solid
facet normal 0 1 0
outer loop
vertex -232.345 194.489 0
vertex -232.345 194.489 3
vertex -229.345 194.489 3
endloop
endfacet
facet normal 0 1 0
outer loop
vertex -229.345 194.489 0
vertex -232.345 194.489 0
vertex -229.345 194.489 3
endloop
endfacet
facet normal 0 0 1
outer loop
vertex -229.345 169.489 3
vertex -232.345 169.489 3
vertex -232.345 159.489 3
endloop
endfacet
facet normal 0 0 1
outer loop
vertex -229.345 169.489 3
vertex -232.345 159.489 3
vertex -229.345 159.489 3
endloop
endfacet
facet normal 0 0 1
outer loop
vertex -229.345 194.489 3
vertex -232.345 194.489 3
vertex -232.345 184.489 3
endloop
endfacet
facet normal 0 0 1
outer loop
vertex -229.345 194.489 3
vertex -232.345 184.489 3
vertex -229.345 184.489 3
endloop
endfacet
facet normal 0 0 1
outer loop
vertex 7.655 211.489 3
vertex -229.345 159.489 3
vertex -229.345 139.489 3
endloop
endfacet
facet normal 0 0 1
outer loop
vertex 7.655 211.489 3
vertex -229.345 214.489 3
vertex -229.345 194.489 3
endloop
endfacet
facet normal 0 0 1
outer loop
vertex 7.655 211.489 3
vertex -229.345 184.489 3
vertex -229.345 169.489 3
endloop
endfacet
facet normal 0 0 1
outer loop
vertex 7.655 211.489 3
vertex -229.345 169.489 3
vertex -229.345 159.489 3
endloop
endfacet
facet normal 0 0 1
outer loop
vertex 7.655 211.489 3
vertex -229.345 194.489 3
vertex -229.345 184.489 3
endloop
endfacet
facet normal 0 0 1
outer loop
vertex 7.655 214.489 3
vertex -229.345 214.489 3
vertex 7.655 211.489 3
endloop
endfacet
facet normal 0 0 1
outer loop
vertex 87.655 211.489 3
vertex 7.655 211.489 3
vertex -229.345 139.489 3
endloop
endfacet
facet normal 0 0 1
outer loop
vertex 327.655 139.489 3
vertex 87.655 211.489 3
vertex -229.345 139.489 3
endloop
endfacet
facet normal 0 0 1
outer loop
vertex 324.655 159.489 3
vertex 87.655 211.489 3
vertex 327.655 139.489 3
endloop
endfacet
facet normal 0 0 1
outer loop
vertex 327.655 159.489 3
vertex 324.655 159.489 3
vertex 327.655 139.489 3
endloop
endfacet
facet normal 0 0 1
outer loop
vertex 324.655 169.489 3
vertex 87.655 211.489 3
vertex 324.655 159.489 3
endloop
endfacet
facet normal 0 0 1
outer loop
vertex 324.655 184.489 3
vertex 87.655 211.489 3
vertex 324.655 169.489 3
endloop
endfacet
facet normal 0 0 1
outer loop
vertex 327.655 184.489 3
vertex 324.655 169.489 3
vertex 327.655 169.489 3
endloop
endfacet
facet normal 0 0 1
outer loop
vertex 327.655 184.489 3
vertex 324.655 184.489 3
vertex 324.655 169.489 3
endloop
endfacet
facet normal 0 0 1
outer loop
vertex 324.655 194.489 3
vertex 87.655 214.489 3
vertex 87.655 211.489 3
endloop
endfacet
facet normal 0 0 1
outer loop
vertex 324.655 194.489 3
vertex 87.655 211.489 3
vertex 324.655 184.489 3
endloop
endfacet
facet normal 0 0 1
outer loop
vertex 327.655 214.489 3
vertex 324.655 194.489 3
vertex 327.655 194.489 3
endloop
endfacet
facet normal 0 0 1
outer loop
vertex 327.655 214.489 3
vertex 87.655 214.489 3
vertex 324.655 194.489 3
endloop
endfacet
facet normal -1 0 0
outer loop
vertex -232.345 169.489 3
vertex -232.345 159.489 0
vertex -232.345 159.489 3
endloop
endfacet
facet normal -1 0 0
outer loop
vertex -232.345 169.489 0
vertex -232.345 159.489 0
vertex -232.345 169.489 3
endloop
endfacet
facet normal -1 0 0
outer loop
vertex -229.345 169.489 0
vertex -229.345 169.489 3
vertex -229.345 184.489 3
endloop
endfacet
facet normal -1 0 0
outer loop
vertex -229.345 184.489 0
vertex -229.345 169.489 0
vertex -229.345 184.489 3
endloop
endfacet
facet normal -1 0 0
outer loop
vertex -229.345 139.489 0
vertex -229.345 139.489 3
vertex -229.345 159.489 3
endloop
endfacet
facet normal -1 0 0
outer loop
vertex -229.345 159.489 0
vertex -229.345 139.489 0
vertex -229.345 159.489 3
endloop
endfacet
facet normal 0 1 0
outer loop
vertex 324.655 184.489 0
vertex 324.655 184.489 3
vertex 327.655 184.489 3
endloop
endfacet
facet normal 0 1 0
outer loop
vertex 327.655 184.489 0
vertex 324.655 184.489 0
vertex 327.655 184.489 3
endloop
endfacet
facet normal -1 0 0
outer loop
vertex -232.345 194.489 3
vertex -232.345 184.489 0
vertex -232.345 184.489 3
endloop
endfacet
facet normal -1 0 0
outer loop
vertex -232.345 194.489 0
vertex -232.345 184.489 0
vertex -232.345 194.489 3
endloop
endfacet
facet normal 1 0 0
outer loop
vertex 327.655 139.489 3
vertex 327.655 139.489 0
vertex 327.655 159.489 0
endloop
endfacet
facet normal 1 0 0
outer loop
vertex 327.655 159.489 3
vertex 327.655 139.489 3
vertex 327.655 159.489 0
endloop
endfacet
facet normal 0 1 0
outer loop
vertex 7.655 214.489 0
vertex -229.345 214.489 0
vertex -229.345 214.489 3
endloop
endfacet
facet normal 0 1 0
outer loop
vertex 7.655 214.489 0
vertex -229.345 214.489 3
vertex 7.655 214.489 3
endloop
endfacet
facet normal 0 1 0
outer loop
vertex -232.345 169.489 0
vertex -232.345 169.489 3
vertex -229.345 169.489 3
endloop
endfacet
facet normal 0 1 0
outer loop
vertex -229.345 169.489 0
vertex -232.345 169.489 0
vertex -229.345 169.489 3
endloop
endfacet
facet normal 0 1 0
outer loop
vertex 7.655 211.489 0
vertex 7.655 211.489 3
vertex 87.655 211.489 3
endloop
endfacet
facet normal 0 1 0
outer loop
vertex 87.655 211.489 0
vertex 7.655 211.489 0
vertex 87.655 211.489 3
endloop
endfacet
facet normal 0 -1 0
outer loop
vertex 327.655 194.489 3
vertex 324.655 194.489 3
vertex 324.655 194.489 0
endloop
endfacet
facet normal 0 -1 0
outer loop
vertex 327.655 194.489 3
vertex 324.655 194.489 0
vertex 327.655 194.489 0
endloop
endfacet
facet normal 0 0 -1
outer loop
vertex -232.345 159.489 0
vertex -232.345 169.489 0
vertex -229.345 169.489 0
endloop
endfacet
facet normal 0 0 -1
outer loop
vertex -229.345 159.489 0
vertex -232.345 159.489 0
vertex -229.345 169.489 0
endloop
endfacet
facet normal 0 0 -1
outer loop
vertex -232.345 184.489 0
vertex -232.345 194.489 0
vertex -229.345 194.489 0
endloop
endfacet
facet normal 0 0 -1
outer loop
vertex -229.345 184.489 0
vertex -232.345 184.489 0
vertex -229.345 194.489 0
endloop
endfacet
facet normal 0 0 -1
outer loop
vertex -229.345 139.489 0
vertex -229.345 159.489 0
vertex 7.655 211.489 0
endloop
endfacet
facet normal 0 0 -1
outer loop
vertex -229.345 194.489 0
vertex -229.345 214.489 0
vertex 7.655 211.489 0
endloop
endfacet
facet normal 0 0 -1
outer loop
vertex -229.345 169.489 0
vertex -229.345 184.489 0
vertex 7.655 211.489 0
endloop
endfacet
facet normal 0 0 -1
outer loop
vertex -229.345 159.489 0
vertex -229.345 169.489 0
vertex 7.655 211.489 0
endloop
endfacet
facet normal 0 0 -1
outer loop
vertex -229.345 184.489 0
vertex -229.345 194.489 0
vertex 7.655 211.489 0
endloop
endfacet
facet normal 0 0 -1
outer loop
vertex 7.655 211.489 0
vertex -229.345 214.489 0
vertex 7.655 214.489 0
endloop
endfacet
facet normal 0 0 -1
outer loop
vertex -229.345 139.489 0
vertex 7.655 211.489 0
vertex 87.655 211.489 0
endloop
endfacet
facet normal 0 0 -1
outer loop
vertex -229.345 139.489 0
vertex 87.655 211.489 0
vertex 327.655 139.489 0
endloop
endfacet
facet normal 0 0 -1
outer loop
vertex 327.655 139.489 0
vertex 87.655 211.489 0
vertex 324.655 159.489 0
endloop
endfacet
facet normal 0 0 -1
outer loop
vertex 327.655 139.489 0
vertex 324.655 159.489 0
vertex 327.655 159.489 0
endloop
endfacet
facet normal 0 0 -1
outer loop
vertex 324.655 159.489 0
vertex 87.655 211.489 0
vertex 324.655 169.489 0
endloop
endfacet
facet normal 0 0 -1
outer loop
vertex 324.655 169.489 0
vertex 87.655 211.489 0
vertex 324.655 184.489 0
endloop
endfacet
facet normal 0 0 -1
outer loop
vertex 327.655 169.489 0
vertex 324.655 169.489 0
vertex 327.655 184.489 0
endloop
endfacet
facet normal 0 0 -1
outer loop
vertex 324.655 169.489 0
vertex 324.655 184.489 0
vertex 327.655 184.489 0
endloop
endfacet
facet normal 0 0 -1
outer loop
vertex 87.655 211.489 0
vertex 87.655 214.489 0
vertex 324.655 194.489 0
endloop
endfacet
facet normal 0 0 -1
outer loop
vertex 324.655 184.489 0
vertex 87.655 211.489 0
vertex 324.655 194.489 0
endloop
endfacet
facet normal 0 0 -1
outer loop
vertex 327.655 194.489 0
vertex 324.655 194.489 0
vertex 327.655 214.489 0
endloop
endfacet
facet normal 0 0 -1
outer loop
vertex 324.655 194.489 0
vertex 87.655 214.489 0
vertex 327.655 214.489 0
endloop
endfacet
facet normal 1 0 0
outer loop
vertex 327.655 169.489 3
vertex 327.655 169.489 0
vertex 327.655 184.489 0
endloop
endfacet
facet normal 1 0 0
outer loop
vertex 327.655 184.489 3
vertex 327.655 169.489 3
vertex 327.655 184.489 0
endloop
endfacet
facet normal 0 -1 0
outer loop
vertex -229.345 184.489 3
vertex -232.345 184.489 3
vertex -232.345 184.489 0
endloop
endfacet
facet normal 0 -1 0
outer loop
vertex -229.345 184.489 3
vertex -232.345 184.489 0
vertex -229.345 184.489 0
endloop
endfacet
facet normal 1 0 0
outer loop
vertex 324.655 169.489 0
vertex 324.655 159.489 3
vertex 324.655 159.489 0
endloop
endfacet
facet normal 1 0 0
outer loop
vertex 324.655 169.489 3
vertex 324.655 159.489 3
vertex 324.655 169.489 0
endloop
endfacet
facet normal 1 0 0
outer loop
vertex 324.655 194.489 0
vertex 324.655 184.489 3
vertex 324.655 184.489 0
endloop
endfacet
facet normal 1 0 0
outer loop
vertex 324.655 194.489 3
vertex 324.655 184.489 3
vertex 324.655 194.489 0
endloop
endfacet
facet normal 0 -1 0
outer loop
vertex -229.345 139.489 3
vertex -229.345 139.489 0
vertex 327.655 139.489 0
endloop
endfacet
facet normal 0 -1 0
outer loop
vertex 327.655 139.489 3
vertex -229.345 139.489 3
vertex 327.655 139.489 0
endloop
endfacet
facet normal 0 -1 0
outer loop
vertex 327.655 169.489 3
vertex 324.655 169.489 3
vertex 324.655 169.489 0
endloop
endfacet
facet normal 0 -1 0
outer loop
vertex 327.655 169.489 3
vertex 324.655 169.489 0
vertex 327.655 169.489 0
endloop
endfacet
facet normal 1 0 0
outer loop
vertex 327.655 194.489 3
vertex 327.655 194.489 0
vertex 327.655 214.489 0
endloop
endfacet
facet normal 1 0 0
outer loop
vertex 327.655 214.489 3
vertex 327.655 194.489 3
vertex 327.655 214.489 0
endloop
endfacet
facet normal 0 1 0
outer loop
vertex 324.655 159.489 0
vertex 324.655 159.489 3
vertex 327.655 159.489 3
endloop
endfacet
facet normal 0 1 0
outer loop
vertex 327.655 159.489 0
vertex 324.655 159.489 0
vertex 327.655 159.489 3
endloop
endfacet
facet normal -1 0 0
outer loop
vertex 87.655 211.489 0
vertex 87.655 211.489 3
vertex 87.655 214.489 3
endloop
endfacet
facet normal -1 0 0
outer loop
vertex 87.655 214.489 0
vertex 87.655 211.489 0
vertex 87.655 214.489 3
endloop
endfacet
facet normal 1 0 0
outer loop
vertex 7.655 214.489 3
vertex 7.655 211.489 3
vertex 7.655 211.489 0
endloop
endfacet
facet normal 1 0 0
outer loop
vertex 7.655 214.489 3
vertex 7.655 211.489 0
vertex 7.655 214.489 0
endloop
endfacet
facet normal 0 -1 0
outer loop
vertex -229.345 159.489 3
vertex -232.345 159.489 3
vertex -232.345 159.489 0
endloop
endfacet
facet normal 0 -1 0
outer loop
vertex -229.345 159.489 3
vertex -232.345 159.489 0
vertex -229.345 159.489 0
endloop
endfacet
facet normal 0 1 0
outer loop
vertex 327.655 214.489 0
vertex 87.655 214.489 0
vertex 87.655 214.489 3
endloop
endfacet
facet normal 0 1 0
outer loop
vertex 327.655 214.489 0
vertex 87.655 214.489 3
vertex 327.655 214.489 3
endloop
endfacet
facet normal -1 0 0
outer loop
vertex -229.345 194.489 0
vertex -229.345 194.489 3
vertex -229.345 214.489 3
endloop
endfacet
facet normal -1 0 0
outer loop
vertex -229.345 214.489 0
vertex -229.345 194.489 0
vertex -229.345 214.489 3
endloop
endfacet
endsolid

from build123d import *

# Parameters (mm, degrees)
SKETCH1_W           = 560
SKETCH1_H           = 75
BOSS_EXTRUDE1_DEPTH = 3
SKETCH2_W           = 3
SKETCH2_H           = 10
CUT_EXTRUDE1_DEPTH  = 3
SKETCH3_W           = 3
SKETCH3_H           = 20
SKETCH3_H_2         = 15
CUT_EXTRUDE2_DEPTH  = 3
SKETCH4_W           = 80
SKETCH4_H           = 3
CUT_EXTRUDE3_DEPTH  = 3


with BuildPart() as part:
    # Sketch1 → Boss-Extrude1 (new body)
    with BuildSketch(Plane.XY):
        with Locations((47.655062333, 176.988975695)):
            Rectangle(SKETCH1_W, SKETCH1_H)
    extrude(amount=BOSS_EXTRUDE1_DEPTH)

    # Sketch2 → Cut-Extrude1 (cut)
    with BuildSketch(Plane.XY.offset(3)):
        with Locations((326.155062333, 189.488975695)):
            Rectangle(SKETCH2_W, SKETCH2_H)
        with Locations((326.155062333, 164.488975695)):
            Rectangle(SKETCH2_W, SKETCH2_H)
    extrude(amount=-CUT_EXTRUDE1_DEPTH, mode=Mode.SUBTRACT)

    # Sketch3 → Cut-Extrude2 (cut)
    with BuildSketch(Plane.XY.offset(3)):
        with Locations((-230.844937667, 204.488975695)):
            Rectangle(SKETCH3_W, SKETCH3_H)
        with Locations((-230.844937667, 149.488975695)):
            Rectangle(SKETCH3_W, SKETCH3_H)
        with Locations((-230.844937667, 176.988975695)):
            Rectangle(SKETCH3_W, SKETCH3_H_2)
    extrude(amount=-CUT_EXTRUDE2_DEPTH, mode=Mode.SUBTRACT)

    # Sketch4 → Cut-Extrude3 (cut)
    with BuildSketch(Plane.XY.offset(3)):
        with Locations((47.655062333, 212.988975695)):
            Rectangle(SKETCH4_W, SKETCH4_H)
    extrude(amount=-CUT_EXTRUDE3_DEPTH, mode=Mode.SUBTRACT)


solid = part.part
